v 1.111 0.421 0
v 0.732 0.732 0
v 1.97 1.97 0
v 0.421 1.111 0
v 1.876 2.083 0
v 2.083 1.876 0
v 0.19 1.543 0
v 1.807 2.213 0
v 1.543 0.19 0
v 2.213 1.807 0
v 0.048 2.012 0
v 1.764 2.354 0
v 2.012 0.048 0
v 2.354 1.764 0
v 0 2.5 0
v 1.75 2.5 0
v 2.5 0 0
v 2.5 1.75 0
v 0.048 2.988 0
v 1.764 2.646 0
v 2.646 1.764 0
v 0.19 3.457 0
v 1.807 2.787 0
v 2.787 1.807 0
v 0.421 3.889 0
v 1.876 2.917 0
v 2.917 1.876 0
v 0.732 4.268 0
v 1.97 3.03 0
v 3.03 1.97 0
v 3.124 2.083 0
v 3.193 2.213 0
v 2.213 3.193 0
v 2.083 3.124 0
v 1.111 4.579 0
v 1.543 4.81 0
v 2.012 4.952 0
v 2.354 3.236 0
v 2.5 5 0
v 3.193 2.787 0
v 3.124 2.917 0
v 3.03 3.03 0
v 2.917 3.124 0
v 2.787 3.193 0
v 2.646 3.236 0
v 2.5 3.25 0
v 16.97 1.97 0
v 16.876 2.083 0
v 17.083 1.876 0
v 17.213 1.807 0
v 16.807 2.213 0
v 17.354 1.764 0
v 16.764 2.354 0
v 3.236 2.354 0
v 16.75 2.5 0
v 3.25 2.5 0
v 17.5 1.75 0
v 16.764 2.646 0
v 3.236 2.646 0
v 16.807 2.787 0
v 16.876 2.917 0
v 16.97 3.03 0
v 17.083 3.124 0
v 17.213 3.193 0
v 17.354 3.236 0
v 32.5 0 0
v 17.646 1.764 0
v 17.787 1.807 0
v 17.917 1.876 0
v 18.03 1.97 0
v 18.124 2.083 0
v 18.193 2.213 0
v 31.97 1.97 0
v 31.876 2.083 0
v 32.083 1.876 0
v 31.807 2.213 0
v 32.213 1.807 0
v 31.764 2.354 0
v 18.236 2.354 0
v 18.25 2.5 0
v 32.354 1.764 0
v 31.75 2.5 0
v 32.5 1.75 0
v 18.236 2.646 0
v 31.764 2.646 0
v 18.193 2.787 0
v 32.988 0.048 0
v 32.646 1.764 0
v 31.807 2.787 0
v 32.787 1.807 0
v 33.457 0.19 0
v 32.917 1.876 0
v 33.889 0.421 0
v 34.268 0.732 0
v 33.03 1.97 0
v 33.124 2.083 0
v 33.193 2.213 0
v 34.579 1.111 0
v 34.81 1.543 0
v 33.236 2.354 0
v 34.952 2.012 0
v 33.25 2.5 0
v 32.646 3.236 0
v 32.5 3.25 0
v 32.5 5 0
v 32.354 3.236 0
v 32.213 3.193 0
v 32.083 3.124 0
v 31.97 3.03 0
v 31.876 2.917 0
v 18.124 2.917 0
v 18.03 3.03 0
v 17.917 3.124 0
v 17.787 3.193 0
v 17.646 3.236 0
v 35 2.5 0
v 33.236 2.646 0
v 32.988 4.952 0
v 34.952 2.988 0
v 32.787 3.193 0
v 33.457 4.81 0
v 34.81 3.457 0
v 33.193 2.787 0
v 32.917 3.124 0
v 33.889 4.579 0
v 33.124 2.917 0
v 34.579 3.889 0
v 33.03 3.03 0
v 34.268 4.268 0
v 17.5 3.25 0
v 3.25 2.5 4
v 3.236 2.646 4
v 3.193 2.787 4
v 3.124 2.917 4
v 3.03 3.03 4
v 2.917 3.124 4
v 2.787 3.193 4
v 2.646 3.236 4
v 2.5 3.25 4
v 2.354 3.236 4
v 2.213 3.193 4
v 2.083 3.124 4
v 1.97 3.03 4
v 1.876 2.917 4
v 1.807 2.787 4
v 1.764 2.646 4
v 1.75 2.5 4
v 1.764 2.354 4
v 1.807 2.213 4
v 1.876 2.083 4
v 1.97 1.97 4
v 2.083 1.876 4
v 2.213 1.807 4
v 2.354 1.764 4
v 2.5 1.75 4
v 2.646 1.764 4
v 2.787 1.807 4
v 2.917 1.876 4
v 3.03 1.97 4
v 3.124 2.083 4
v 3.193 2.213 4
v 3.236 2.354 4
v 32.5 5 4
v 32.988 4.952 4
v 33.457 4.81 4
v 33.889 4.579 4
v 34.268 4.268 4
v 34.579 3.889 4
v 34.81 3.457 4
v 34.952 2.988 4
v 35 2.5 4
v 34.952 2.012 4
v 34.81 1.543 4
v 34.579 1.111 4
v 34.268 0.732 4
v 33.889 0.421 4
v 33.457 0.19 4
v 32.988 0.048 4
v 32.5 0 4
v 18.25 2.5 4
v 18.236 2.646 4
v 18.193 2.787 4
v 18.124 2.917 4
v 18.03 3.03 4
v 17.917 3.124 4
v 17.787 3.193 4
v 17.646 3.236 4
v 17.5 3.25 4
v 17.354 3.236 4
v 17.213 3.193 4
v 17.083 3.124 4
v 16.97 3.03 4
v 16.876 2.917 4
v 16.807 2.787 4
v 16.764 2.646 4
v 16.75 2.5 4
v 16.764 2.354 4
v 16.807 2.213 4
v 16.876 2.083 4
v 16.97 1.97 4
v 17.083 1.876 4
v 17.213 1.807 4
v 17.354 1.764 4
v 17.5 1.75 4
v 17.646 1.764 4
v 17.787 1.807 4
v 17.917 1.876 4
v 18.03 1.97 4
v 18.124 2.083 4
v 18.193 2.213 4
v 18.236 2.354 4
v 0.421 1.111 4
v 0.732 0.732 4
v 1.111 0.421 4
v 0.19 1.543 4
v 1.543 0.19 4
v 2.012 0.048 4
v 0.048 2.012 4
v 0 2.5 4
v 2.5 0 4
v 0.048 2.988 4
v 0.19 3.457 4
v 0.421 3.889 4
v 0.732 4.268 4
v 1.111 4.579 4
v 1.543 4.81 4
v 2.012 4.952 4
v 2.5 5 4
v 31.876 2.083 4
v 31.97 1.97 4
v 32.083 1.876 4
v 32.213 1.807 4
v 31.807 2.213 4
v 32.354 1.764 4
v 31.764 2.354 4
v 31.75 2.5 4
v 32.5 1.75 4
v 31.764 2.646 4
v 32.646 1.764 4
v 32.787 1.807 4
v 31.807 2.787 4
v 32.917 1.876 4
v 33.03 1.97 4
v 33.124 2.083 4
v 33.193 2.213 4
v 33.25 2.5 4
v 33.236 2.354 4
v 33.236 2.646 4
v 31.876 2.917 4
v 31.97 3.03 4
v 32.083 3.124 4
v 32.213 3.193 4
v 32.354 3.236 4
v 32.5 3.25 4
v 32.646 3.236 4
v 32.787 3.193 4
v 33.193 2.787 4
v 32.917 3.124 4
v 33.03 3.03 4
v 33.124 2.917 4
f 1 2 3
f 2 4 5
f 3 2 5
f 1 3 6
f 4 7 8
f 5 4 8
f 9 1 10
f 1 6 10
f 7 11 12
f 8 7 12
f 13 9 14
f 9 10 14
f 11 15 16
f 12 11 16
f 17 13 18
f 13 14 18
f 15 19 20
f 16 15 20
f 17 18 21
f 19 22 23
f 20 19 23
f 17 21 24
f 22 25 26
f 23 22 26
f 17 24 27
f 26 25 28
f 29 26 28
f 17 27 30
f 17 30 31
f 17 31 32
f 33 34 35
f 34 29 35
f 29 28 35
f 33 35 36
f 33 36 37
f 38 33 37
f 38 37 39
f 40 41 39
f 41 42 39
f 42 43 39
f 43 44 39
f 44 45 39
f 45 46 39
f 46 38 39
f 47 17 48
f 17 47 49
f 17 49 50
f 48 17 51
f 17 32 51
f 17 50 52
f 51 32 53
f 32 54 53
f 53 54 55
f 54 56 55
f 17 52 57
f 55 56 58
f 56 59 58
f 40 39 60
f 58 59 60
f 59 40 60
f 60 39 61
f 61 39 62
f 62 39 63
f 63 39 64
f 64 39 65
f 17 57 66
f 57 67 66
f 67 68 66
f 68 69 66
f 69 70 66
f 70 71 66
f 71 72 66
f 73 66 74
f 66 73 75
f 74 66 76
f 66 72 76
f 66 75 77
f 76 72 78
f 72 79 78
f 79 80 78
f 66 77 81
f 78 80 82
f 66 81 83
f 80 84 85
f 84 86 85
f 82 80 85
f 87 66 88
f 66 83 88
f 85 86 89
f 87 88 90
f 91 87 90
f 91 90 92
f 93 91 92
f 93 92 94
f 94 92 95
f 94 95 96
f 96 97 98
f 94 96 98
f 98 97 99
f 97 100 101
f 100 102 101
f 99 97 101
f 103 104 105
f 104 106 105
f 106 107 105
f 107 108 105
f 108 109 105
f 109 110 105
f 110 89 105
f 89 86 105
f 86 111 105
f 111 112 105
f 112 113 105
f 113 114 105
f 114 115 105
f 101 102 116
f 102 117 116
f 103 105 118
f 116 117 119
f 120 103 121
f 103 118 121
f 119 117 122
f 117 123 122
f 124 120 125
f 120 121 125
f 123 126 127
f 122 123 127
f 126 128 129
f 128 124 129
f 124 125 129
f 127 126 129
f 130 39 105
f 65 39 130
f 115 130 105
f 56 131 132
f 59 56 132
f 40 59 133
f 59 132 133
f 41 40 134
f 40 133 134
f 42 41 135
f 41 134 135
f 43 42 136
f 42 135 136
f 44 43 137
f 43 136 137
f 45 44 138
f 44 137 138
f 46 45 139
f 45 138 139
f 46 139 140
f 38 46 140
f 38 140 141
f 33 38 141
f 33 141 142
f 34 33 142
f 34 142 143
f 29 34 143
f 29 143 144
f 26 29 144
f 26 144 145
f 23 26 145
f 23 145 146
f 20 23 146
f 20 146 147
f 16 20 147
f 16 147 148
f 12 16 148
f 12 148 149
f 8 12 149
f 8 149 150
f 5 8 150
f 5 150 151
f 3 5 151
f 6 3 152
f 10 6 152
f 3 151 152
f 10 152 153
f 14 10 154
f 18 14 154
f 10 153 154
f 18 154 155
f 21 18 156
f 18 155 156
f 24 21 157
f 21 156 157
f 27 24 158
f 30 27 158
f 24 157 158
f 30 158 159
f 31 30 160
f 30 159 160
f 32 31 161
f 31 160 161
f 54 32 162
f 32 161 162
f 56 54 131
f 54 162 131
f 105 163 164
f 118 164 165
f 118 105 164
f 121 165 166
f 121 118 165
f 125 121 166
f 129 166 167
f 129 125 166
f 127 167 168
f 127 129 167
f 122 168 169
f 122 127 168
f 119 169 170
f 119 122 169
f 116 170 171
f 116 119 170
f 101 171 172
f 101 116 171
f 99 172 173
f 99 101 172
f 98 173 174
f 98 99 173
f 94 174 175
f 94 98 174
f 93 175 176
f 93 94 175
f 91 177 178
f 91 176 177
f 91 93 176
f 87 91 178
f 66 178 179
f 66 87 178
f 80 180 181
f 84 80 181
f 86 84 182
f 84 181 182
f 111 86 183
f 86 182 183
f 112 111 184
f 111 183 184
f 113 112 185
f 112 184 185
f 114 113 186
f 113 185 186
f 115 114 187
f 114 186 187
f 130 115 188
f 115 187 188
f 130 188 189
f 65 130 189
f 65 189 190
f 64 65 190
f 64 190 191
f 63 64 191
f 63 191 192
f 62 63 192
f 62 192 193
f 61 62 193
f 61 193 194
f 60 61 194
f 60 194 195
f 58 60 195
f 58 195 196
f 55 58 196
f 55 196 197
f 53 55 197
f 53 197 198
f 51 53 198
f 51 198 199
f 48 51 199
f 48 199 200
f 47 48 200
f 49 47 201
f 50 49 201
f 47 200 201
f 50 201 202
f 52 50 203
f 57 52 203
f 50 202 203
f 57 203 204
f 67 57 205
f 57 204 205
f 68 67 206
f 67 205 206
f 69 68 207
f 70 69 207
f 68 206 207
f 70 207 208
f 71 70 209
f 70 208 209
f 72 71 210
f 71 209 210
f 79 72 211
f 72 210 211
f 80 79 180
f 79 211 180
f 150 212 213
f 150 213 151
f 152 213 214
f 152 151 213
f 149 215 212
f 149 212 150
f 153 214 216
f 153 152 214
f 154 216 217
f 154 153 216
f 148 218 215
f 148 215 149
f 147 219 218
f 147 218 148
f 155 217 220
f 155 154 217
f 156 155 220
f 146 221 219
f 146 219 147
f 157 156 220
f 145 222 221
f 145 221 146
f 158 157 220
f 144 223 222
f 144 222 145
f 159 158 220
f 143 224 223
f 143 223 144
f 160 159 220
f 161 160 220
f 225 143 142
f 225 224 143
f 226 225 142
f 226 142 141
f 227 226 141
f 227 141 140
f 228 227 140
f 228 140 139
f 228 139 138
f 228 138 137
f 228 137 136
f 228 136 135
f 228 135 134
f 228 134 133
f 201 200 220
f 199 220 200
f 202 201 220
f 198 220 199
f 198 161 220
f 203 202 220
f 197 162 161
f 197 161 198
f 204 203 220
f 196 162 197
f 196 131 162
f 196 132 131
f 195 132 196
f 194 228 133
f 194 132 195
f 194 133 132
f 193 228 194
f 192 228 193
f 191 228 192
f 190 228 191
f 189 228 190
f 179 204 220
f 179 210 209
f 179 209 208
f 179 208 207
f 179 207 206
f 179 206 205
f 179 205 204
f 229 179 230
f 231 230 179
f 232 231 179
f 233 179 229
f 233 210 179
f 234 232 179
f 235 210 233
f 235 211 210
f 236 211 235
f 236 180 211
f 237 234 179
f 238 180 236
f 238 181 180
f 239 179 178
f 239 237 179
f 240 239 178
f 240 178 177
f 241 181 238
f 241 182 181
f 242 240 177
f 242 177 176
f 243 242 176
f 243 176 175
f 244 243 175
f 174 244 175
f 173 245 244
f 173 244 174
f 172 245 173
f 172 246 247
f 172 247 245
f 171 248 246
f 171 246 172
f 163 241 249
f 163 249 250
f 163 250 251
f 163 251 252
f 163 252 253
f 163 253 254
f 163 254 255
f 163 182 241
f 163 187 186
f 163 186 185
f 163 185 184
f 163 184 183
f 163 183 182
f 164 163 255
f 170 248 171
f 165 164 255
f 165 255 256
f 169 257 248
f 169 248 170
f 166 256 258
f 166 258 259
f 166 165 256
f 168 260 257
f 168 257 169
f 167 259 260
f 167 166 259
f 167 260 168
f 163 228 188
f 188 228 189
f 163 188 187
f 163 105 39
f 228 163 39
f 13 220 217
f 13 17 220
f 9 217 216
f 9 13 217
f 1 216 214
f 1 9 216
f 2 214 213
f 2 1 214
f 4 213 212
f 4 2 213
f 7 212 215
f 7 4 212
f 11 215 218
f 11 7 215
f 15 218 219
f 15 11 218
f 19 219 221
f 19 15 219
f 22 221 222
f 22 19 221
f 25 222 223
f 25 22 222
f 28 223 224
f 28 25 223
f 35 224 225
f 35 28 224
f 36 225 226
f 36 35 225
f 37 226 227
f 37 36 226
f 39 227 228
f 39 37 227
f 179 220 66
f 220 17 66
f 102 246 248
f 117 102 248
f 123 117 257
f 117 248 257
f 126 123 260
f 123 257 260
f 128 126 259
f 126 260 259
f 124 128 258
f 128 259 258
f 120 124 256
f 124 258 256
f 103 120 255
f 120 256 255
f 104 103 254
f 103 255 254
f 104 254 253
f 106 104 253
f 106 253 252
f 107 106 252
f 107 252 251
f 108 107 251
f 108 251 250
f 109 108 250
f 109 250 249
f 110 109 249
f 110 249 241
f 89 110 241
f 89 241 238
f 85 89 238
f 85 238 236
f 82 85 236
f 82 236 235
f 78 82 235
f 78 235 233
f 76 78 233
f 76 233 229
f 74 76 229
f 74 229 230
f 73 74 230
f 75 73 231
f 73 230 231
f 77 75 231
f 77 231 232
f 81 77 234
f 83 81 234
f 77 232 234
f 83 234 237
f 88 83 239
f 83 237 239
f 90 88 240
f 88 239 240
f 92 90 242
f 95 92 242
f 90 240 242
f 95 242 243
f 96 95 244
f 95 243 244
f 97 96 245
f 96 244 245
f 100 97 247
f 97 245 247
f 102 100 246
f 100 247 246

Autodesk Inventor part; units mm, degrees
ref_plane "YZ Plane" through (0, 0, 0) normal (1, 0, 0) x (0, 1, 0)
ref_plane "XZ Plane" through (0, 0, 0) normal (0, 1, 0) x (-1, 0, 0)
ref_plane "XY Plane" through (0, 0, 0) normal (0, 0, 1) x (1, 0, 0)
sketch "Skizze1" plane through (0, 0, 0) normal (0, 0, 1) x (1, 0, 0)
  line L0 (2.5, 0) -> (32.5, 0)
  line L1 (35, 2.5) -> (35, 2.5)
  line L2 (32.5, 5) -> (2.5, 5)
  line L3 (0, 2.5) -> (0, 2.5)
  arc A0 (2.5, 5) -> (0, 2.5) centre (2.5, 2.5) ccw
  arc A1 (0, 2.5) -> (2.5, 0) centre (2.5, 2.5) ccw
  arc A2 (35, 2.5) -> (32.5, 5) centre (32.5, 2.5) ccw
  arc A3 (32.5, 0) -> (35, 2.5) centre (32.5, 2.5) ccw
  point P0 (0, 0)
  point P1 (35, 5)
  point P2 (35, 0)
  point P3 (0, 5)
  dimension "d0" = 35
  dimension "d1" = 5
  dimension "d14" = 2.5
extrude "Extrusion1" add sketch "Skizze1" along normal blind 4
sketch "Skizze2" plane through (0, 0, 4) normal (0, 0, 1) x (1, 0, 0)
  line L0 (0, 0) -> (32.5, 0) projected
  line L1 (0, 0) -> (2.5, 0)
  line L2 (2.5, 0) -> (0, 0)
  line L3 (2.5, 0) -> (2.5, 2.5)
  circle A0 centre (2.5, 2.5) radius 0.75
  line L4 (35, 0) -> (32.5, 0)
  line L5 (32.5, 0) -> (32.5, 2.5)
  circle A1 centre (32.5, 2.5) radius 0.75
  line L6 (0, 0) -> (17.5, 0)
  line L7 (17.5, 0) -> (17.5, 2.5)
  circle A2 centre (17.5, 2.5) radius 0.75
  dimension "d4" = 2.5
  dimension "d5" = 2.5
  dimension "d6" = 2.5
  dimension "d7" = 1.5
  dimension "d8" = 2.5
  dimension "d9" = 17.5
  dimension "d10" = 1.5
  dimension "d11" = 1.5
  dimension "d15" = 2.5
  dimension "d16" = 2.5
extrude "Extrusion2" cut sketch "Skizze2" against normal blind 5
properties part number "Hebel_KLemme_Hebel"
